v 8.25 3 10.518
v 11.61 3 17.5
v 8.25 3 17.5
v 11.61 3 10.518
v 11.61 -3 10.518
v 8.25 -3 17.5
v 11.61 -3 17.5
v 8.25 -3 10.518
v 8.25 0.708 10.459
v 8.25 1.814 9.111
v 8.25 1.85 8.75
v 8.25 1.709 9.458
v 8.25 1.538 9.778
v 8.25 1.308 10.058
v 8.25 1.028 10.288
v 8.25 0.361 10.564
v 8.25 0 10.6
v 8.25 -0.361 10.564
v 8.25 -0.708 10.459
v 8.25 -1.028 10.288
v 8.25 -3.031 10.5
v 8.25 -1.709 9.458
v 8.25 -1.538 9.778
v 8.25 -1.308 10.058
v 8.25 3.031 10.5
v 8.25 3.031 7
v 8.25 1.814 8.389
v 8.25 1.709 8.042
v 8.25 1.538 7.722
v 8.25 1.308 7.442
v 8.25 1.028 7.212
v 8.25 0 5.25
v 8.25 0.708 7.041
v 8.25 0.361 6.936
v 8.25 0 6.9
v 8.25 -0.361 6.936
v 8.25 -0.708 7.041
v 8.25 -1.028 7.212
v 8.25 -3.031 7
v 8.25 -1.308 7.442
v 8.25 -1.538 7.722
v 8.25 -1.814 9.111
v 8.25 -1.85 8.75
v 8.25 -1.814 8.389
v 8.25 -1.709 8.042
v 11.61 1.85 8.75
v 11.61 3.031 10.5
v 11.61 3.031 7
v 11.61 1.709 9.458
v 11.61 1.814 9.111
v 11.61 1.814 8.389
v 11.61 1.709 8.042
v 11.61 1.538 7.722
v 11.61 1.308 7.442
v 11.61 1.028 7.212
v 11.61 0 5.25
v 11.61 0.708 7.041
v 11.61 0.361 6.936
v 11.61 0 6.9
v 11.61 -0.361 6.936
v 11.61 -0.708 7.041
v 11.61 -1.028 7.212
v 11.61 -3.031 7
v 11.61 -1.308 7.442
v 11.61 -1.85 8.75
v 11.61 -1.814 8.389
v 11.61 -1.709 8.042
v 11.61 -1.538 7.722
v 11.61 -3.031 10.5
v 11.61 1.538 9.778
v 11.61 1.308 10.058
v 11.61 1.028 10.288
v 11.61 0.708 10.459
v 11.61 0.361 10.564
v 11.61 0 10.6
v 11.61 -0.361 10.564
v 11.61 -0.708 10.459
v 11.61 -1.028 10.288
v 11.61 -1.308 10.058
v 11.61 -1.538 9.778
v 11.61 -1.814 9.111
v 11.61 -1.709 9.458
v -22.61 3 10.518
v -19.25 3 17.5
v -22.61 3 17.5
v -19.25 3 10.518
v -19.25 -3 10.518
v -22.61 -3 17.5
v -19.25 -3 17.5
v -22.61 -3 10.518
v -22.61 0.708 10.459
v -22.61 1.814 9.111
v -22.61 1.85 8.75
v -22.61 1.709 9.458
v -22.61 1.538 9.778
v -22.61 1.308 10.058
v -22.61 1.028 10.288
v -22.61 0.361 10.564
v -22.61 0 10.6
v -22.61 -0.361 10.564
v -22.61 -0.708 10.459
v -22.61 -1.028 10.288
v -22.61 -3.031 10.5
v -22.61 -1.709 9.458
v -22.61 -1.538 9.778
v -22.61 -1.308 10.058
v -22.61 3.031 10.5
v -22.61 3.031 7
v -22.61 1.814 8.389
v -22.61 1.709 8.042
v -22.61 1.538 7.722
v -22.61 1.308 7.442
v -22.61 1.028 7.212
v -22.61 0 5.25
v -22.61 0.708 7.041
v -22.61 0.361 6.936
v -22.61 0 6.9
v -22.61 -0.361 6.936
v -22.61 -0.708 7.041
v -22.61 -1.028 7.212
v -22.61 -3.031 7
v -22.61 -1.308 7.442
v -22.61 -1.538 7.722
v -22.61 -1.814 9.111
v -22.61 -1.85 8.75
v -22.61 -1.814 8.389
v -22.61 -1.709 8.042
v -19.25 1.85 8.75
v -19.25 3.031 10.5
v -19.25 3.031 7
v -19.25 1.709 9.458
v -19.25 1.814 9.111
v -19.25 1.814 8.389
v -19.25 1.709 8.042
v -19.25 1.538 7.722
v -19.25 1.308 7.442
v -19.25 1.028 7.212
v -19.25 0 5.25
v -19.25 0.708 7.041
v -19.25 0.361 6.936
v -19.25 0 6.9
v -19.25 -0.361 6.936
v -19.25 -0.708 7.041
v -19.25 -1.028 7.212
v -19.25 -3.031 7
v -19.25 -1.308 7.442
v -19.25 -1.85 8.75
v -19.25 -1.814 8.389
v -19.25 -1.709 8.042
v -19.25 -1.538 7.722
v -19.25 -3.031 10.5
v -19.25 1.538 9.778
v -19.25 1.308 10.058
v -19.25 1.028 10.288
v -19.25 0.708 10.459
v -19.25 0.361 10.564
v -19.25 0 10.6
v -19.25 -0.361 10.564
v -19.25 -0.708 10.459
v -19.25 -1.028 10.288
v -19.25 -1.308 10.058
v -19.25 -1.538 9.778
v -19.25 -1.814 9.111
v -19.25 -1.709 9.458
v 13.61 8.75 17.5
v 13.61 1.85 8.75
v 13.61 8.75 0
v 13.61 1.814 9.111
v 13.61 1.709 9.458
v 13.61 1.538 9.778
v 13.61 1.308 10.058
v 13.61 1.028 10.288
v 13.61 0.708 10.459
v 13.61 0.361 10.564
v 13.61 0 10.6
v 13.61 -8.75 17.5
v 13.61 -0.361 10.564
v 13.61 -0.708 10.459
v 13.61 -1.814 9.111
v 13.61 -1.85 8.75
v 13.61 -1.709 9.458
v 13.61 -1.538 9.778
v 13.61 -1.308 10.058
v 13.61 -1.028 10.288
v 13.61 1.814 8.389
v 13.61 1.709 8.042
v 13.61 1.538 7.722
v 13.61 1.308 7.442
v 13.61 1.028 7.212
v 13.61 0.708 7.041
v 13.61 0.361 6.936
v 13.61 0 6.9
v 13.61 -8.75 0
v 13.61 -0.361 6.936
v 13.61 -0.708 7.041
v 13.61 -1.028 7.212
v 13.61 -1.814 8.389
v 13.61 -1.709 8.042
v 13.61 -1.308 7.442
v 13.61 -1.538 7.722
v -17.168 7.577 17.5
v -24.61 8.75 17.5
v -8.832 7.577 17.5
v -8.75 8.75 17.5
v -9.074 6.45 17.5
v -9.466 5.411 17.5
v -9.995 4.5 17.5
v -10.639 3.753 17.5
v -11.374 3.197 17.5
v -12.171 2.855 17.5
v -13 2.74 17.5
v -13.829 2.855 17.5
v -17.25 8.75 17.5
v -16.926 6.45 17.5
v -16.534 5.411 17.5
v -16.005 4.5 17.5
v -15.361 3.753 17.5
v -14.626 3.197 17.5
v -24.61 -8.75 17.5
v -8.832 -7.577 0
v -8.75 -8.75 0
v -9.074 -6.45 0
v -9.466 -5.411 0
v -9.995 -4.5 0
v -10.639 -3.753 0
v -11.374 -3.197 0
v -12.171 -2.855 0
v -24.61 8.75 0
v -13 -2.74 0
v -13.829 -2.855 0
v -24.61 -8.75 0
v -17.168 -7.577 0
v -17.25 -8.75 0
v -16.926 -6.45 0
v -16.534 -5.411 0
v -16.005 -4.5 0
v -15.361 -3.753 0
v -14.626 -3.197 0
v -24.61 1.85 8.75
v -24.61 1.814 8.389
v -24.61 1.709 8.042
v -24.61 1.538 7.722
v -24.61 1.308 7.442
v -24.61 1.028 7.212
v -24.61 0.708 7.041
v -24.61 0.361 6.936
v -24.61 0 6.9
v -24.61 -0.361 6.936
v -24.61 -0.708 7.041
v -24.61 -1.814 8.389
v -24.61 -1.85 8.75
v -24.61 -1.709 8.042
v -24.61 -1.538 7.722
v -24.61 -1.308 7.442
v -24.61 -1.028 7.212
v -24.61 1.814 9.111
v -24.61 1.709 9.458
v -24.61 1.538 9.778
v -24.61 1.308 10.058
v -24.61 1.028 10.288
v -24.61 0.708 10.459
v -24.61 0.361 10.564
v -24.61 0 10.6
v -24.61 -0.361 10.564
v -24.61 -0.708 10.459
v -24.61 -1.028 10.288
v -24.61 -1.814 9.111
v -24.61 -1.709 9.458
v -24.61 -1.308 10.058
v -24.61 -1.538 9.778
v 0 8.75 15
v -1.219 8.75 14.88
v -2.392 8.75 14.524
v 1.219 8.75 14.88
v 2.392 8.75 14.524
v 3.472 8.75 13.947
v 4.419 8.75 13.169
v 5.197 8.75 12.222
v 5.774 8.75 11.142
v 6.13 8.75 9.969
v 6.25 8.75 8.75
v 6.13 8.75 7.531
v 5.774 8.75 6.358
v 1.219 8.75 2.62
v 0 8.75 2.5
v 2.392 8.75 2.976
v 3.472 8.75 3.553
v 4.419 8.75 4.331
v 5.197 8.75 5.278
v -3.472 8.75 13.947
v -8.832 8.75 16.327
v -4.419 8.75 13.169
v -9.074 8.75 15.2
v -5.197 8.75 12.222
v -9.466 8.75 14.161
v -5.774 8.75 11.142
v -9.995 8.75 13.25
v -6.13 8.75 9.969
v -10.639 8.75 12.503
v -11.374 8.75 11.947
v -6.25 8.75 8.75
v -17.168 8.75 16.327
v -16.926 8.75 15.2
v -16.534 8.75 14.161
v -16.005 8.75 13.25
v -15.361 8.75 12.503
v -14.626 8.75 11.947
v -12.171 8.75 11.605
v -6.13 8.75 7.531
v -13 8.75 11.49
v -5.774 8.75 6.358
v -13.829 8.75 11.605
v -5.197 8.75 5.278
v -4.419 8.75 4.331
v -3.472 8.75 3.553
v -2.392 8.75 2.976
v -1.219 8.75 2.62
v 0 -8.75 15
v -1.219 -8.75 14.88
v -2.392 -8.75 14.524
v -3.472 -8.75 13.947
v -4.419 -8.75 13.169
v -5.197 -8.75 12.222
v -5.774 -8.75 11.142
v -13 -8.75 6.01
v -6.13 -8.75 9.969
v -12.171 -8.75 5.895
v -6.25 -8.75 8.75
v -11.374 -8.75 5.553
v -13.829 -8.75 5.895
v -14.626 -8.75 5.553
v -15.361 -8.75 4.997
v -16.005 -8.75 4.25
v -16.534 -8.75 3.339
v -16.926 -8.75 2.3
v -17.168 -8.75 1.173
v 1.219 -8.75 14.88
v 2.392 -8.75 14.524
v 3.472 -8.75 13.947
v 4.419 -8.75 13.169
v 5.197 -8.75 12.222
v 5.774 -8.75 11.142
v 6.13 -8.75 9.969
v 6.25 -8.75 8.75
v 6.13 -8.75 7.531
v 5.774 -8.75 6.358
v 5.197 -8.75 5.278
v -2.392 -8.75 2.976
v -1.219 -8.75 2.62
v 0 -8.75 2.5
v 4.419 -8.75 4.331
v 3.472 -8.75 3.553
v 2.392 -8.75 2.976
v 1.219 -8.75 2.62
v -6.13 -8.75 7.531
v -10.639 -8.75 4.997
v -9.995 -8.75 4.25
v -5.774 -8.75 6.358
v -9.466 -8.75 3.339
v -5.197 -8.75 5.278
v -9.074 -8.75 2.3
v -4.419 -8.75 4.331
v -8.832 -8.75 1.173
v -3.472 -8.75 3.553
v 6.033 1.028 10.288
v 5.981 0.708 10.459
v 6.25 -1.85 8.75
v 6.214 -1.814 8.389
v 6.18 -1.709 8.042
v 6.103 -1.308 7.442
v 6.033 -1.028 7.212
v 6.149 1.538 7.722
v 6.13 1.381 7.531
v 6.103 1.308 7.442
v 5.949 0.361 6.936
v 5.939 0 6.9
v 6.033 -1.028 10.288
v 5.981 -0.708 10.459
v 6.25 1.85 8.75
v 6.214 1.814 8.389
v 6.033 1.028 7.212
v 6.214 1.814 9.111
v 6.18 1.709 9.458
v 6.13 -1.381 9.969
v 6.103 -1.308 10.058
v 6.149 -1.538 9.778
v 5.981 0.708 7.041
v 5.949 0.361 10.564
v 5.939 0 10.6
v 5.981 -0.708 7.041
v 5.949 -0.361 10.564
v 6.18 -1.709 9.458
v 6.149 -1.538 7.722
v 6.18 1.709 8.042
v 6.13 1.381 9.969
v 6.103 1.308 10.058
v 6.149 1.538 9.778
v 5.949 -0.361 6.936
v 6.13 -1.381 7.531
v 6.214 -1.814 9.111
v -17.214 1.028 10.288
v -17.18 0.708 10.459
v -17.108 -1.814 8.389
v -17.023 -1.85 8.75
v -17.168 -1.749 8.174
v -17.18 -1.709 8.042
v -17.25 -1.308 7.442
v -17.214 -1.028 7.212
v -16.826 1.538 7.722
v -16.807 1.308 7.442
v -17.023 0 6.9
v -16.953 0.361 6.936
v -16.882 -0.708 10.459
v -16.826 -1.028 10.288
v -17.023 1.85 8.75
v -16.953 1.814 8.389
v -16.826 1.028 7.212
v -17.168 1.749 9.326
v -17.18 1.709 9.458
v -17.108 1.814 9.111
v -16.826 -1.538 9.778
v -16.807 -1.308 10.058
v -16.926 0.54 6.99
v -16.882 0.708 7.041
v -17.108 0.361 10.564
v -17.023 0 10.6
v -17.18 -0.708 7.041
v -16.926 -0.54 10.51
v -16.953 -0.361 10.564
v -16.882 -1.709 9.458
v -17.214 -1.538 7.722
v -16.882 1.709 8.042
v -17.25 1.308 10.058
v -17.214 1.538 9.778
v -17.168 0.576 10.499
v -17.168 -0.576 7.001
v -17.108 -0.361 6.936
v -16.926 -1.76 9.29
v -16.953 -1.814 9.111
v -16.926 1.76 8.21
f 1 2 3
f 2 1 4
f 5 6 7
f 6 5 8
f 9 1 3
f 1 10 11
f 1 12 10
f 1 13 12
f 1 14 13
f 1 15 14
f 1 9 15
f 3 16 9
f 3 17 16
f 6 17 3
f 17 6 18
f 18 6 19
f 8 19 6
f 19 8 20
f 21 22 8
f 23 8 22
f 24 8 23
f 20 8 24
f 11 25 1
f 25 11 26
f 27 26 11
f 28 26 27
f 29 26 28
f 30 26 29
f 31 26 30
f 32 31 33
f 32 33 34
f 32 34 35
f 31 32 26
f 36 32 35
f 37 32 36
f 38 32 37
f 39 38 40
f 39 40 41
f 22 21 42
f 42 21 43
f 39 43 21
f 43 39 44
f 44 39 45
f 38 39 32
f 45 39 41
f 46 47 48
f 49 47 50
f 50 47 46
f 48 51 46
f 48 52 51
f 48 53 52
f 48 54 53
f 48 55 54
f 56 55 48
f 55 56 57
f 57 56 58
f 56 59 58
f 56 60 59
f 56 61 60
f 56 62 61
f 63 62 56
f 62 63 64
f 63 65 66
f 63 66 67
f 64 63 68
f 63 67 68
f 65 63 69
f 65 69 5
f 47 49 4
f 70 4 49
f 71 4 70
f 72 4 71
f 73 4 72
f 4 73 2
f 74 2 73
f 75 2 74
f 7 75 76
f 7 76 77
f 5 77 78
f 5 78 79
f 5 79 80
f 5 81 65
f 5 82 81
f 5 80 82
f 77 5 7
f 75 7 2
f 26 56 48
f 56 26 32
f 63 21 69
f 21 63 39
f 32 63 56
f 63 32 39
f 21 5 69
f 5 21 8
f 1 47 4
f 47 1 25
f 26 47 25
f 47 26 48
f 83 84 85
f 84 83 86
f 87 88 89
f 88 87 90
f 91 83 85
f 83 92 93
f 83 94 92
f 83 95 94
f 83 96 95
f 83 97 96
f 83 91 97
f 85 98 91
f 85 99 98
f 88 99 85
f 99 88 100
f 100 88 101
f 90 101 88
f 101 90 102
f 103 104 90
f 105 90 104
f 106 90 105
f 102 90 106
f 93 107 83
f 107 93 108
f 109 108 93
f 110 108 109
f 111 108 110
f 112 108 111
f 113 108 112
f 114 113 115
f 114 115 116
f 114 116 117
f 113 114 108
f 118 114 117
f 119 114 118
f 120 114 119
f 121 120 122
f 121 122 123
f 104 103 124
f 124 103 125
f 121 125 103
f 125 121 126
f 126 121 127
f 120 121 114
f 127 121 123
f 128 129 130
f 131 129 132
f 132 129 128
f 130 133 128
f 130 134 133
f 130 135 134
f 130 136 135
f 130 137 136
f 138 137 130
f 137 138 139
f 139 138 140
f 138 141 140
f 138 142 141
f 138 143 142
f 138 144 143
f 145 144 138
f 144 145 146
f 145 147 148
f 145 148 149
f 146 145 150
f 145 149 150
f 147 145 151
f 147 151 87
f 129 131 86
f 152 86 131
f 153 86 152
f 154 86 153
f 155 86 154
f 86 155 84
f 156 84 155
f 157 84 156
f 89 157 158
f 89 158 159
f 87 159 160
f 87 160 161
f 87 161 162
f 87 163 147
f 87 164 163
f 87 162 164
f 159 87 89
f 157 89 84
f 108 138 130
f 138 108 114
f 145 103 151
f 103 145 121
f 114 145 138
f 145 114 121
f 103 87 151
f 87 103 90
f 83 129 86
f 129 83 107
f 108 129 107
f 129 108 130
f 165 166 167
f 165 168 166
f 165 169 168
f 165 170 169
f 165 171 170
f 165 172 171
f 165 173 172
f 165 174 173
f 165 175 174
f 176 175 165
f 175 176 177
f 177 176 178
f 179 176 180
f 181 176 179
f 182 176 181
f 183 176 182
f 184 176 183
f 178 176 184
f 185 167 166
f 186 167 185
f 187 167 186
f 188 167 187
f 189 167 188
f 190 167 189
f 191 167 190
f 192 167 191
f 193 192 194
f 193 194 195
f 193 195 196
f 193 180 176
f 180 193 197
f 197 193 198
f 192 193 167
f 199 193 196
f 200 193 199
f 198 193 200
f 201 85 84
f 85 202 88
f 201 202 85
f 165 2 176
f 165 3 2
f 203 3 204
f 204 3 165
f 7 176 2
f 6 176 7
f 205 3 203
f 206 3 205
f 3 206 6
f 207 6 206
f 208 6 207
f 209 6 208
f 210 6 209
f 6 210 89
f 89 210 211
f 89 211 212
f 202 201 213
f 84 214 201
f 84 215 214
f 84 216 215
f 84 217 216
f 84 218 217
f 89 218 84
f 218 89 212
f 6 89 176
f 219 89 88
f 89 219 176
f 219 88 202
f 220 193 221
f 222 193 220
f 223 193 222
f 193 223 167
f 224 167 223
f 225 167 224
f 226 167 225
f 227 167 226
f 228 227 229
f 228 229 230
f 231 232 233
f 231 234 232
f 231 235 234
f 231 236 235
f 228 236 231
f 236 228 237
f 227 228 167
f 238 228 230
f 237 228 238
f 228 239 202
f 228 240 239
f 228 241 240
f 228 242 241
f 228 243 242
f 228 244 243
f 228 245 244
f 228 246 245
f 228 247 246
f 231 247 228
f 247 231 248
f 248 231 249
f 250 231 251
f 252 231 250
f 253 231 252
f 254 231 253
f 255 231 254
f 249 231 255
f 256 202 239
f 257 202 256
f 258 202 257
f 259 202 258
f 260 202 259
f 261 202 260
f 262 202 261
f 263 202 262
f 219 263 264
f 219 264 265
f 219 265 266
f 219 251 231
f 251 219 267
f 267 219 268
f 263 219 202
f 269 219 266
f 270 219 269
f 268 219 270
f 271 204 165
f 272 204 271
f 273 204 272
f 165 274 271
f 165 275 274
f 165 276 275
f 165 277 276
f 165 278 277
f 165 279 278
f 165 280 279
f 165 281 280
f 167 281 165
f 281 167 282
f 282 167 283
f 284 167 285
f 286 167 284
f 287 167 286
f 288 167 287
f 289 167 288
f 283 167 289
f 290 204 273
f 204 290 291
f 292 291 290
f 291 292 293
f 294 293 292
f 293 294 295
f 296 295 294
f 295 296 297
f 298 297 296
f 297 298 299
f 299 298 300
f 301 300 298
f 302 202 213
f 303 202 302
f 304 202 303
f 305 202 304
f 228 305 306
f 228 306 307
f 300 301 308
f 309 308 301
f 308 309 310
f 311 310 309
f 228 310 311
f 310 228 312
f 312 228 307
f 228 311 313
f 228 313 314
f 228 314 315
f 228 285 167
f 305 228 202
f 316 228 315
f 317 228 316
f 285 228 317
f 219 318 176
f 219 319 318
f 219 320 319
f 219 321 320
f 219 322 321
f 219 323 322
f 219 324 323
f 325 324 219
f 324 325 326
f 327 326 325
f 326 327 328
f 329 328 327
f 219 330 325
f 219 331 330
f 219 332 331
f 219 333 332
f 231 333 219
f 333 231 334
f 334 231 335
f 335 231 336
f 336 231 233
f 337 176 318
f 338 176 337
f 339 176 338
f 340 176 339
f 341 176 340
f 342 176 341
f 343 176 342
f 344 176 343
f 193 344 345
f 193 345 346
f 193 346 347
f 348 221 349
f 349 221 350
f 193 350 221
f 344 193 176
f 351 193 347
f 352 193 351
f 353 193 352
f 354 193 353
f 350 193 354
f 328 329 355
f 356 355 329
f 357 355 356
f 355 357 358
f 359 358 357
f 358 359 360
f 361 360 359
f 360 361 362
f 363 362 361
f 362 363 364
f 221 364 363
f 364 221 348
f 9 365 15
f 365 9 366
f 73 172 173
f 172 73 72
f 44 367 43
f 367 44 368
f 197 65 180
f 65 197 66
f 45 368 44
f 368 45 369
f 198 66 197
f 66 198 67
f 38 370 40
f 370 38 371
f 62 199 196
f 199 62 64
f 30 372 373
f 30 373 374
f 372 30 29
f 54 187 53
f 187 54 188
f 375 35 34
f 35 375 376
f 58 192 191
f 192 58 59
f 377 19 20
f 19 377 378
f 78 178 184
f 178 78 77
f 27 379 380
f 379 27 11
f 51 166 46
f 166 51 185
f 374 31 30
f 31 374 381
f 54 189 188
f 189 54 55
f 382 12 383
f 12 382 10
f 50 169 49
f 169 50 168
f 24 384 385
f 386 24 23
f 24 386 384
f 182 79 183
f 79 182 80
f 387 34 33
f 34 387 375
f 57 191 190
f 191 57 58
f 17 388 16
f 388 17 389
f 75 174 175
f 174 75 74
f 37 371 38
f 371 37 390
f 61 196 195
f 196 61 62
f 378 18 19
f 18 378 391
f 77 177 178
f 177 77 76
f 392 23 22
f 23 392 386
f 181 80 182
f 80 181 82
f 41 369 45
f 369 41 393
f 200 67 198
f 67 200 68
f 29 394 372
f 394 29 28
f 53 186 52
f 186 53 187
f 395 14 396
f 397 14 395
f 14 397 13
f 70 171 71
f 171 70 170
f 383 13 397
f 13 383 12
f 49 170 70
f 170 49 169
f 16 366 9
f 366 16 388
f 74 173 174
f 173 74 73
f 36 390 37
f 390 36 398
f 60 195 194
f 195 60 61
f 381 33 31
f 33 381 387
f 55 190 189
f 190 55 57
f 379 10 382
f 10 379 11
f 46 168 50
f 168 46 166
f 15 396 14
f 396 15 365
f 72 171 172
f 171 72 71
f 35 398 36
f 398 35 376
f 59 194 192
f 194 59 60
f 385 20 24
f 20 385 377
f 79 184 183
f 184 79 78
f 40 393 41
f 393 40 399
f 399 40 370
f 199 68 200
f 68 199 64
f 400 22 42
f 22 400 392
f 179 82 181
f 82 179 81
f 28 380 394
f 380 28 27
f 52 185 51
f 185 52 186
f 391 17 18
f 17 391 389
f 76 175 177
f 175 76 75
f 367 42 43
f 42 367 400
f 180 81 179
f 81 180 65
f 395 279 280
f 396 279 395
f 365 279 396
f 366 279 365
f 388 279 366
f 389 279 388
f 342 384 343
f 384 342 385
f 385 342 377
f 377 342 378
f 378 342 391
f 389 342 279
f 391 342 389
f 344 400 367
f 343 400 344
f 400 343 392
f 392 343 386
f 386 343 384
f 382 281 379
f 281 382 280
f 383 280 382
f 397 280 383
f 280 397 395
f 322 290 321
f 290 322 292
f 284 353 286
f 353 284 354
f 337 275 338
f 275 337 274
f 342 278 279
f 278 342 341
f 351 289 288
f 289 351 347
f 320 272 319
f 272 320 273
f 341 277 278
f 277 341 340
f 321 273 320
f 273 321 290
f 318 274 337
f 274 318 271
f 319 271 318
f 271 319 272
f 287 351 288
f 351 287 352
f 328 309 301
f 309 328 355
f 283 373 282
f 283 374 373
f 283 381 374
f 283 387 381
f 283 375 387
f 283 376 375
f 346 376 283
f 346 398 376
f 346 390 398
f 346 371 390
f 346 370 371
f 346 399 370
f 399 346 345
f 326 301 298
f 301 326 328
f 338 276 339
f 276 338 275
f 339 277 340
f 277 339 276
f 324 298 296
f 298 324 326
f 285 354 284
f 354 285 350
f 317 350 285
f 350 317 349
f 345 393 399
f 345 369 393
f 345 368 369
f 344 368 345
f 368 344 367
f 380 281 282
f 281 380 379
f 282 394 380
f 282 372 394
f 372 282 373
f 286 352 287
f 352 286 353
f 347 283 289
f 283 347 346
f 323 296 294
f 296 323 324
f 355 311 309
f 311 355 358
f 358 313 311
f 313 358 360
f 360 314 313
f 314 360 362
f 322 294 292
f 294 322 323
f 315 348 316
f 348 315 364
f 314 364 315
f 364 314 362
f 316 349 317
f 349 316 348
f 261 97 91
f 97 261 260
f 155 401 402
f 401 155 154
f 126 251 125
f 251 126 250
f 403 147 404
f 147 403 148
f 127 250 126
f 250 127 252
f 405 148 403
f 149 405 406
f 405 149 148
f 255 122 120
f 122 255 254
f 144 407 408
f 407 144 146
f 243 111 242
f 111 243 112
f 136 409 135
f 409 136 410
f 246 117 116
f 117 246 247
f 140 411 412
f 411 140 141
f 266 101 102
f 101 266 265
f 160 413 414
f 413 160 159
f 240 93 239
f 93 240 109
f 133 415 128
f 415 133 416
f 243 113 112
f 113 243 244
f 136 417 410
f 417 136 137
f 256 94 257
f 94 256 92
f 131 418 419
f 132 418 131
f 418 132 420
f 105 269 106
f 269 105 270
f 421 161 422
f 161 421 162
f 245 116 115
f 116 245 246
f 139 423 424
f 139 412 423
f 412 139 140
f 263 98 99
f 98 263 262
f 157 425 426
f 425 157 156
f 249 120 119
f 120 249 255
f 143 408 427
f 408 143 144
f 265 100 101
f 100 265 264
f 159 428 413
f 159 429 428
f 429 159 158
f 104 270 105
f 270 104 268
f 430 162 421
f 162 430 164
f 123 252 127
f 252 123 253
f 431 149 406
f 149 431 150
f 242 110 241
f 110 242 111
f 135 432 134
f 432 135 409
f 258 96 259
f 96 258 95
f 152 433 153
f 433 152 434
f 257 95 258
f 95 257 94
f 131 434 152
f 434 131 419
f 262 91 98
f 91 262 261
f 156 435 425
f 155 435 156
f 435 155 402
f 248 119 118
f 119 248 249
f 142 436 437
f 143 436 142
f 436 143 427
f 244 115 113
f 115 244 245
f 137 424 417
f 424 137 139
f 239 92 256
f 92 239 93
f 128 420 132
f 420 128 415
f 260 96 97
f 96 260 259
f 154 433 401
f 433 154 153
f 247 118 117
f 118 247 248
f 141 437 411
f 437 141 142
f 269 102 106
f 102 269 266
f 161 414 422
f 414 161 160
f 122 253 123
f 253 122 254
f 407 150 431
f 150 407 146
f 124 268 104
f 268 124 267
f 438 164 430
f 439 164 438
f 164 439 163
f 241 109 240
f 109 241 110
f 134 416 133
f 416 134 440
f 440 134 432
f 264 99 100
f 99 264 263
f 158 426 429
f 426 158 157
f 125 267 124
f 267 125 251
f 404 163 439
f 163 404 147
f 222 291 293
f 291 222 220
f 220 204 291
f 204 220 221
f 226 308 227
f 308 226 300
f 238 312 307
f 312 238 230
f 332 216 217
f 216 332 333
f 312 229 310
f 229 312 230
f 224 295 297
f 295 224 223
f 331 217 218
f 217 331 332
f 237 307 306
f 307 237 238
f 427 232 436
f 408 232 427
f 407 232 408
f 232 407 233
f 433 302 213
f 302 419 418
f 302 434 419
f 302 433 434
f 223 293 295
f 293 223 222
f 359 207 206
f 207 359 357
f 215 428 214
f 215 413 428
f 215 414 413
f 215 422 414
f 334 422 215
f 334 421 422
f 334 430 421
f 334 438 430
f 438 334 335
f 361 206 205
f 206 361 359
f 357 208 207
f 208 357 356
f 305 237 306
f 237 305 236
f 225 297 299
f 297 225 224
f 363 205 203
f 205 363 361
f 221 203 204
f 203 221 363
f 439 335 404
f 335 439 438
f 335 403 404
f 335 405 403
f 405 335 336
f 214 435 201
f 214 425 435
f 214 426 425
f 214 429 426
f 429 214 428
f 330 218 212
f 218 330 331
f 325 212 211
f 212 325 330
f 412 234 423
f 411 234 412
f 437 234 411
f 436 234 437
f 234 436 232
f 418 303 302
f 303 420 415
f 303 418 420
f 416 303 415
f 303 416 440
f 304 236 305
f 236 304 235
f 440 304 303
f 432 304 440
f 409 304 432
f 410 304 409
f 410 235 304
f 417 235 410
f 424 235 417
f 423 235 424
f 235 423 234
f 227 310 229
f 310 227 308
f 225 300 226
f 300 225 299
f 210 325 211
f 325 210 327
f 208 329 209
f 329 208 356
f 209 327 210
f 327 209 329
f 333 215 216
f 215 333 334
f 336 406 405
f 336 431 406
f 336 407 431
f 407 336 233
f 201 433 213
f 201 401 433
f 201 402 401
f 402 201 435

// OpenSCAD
// NOTE - could try to rotate for "easiest" FDM printing, but that depends on rod/nut/bolt sizes and orientation.
// Someone requested a 45 degree rod option: good idea!


//CUSTOMIZER VARIABLES

/* [Basic_Parameters] */

// Second rod rotation
second_rod_rotation = 45; // [ -45:Negative45, 0:Parallel, 45:Plus45, 90:RightAngle]

// First rod diameter, in mm
first_rod_diameter = 12.0;  // [2.0:0.1:40]

// Second rod diameter, in mm
second_rod_diameter = 8.0; // [2.0:0.1:40]

// Additional rod offset, in mm
rod_offset = 0.0;   // [0.0:0.1:100]

// Bolt diameter, in mm
bolt_diameter = 3.0;    // [2:0.1:20]

// Nut diameter, in mm
nut_diameter = 6.0;  // [3:0.1:40]

// Nut thickness, in mm
nut_thickness = 2.8;  // [1.0:0.1:30]


/* [Extra_Features_for_Strength] */

// Margin to support the rods, in mm
rod_margin = 5; // [2:30]

// Nut clamp width margin, in mm
nut_clamp_margin = 4;   // [2:30]

//CUSTOMIZER VARIABLES END


// Sanity checks
if( second_rod_diameter <= 0 || first_rod_diameter <= 0
    || bolt_diameter <= 0 || nut_diameter <= 0 || nut_thickness <= 0)
{
    echo("<B>Error: Missing important parameters</B>");
}

if(nut_diameter <= bolt_diameter)
{
    echo("<B>Error: Nut size too small for bolt</B>");
}

// how much extra space to allow in nut trap, not user settable
nut_space_factor = 1.20;

nut_trap_len = nut_thickness*nut_space_factor;

bolt_rad = (bolt_diameter+0.7)/2;  // this should be almost loose
first_rad = (first_rod_diameter+0.5)/2;  // should be sorta tight
second_rad = (second_rod_diameter+0.5)/2;  // should be sorta tight

z_rod_diameter = (second_rod_rotation == 90) ? (first_rad*2) : max((first_rad*2),(second_rad*2));
z_nut_size = (second_rod_rotation == 90) ? nut_diameter+nut_clamp_margin : 0;

// x length
main_width = max( 10, (first_rad*2) + (second_rad*2) + max(rod_offset, rod_margin/2) + 2*nut_trap_len + 2*nut_clamp_margin );
// z length
main_depth= max( 10, max(z_rod_diameter+rod_margin,z_nut_size), (bolt_rad*2)+nut_clamp_margin );
// y length
main_heighty = max( 10, (second_rod_rotation==90) ? (second_rad*2)+rod_margin : nut_diameter + nut_clamp_margin, (bolt_rad*2)+nut_clamp_margin );
main_height = (second_rod_rotation == -45 || second_rod_rotation == 45) ? max(main_heighty,main_depth) : main_heighty;


// our object, translated to be flat on xy plane for easy STL generation
translate([0,0,main_depth/2])
    dual_rod_clamp();


module hexagon(height,radius) 
{
  linear_extrude(height)
    circle(radius,$fn=6);
}

module nuttrap(){
  trap_depth = max( main_depth, main_height );
  translate([0,-nut_trap_len/2,trap_depth/2])
    cube([nut_diameter,nut_trap_len,trap_depth],center=true);
  rotate([90,360/12,0]) // so point is down, nut trapped by straight sides
    hexagon(nut_trap_len,(nut_diameter+1)/2);
}


module dual_rod_clamp() {

    first_x = 0;
    second_x = first_x - (second_rad + first_rad + max( rod_offset, rod_margin/2 ) );
    
    first_nut_x = first_x + first_rad + (nut_clamp_margin/2);
    first_nut_y = 0;
    
    second_nut_x = second_x - second_rad - (nut_clamp_margin/2);
    second_nut_y = 0;
    
    rod_length = max(main_height,main_depth) + 20;

    difference() {

      // the main block
      testx = -main_width/2 + first_rad + nut_trap_len + nut_clamp_margin;
      translate([testx,0,0])
        cube([main_width,main_height,main_depth],center = true);


      // first rod clamp nut and bolt hole
      translate([first_nut_x,first_nut_y,0])
        rotate([0,0,90])
          nuttrap();
      translate([first_x,first_nut_y,0])
        rotate([0,90,0])
          cylinder(main_width,bolt_rad,bolt_rad,$fn=32);

      // the first rod
    #color("green")
      translate([first_x,0,0])
        rotate([90,0,0])
          cylinder(rod_length,first_rad,first_rad,center=true,$fn=32);
       

      // second rod clamp nut and bolt hole
      nut_rotation = (second_rod_rotation == 90) ? -90 : 0;  // nut hole also up for +-45
      translate([second_nut_x-nut_trap_len,second_nut_y,0])
        rotate([0,nut_rotation,90])
          nuttrap();
      translate([second_x-main_width,second_nut_y,0])
        rotate([0,90,0])
          cylinder(main_width,bolt_rad,bolt_rad,$fn=32);

      // the second rod
    #color("magenta")
      translate([second_x,0,0])
        rotate([second_rod_rotation-90,0,0])
          cylinder(rod_length,second_rad,second_rad,center=true,$fn=32);
    }
}
